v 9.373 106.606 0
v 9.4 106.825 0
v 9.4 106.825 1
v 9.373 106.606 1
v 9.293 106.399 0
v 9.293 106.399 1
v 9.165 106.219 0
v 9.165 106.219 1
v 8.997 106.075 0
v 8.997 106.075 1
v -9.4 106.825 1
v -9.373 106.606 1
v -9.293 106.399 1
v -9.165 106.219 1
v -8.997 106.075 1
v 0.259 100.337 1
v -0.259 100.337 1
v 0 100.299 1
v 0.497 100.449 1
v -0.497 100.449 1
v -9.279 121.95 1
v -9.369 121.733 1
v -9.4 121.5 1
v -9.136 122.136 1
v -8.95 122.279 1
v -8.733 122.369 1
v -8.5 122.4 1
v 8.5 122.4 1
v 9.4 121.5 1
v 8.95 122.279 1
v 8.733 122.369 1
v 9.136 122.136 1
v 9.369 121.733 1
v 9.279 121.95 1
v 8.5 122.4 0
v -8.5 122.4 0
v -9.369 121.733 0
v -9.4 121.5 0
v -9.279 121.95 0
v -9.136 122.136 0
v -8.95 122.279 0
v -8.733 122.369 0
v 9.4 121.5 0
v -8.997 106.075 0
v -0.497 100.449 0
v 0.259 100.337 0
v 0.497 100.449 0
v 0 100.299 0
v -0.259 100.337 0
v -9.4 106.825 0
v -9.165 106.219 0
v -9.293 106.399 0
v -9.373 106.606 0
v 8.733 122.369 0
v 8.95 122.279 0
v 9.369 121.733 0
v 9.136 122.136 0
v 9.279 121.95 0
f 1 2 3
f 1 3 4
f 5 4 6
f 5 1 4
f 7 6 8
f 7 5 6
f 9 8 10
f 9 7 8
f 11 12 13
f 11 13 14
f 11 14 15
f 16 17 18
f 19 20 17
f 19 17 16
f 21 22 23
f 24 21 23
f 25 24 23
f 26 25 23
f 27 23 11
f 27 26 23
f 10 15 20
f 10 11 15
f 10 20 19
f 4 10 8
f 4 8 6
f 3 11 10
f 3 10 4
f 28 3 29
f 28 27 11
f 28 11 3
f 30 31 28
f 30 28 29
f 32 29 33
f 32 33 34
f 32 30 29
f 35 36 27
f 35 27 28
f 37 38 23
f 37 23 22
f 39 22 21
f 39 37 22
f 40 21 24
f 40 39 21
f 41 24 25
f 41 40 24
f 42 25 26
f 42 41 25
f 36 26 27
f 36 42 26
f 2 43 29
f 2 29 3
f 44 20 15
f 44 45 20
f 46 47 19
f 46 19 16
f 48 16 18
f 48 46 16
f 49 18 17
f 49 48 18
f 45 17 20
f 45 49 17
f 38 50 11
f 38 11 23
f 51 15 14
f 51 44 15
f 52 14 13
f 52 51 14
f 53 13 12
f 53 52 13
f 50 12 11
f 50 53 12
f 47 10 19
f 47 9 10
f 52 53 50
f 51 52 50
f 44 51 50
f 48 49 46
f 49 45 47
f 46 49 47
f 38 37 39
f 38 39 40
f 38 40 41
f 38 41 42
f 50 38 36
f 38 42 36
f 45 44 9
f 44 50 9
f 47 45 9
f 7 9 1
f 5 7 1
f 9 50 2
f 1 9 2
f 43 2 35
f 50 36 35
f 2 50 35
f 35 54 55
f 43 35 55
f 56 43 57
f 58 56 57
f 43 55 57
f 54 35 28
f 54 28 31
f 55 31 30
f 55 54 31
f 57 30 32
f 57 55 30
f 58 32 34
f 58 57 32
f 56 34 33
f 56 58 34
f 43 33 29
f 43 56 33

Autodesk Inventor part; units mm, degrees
ref_plane "YZ Plane" through (0, 0, 0) normal (1, 0, 0) x (0, 1, 0)
ref_plane "XZ Plane" through (0, 0, 0) normal (0, 1, 0) x (-1, 0, 0)
ref_plane "XY Plane" through (0, 0, 0) normal (0, 0, 1) x (1, 0, 0)
ref_plane "Arbeitsebene1" through (0, 0, 0) normal (0, 0, 1) x (1, 0, 0)
sketch "Skizze1" plane through (0, 0, 0) normal (0, 0, 1) x (1, 0, 0)
  line L0 (9.1071, 105.908) -> (0.6071, 100.2819) construction
  arc A0 (9.1071, 105.908) -> (9.6, 106.8252) centre (8.5, 106.8252) ccw construction
  line L1 (9.6, 121.5) -> (9.6, 106.8252) construction
  arc A1 (9.6, 121.5) -> (8.5, 122.6) centre (8.5, 121.5) ccw construction
  line L2 (-8.5, 122.6) -> (8.5, 122.6) construction
  arc A2 (-8.5, 122.6) -> (-9.6, 121.5) centre (-8.5, 121.5) ccw construction
  line L3 (-9.6, 106.8252) -> (-9.6, 121.5) construction
  arc A3 (-9.6, 106.8252) -> (-9.1071, 105.908) centre (-8.5, 106.8252) ccw construction
  line L4 (-0.6071, 100.2819) -> (-9.1071, 105.908) construction
  arc A4 (-0.6071, 100.2819) -> (0.6071, 100.2819) centre (0, 101.1992) ccw construction
  circle A5 centre (5.6569, 118.6569) radius 1.6 construction
  circle A6 centre (5.6569, 107.3431) radius 1.6 construction
  circle A7 centre (-5.6569, 107.3431) radius 1.6 construction
  circle A8 centre (-5.6569, 118.6569) radius 1.6 construction
  circle A9 centre (0, 113) radius 3 construction
  arc A10 (-8.5, 122.4) -> (-9.4, 121.5) centre (-8.5, 121.5) ccw
  line L5 (-8.5, 122.4) -> (8.5, 122.4)
  arc A11 (9.4, 121.5) -> (8.5, 122.4) centre (8.5, 121.5) ccw
  line L6 (9.4, 121.5) -> (9.4, 106.8252)
  arc A12 (8.9967, 106.0747) -> (9.4, 106.8252) centre (8.5, 106.8252) ccw
  line L7 (8.9967, 106.0747) -> (0.4967, 100.4487)
  arc A13 (-0.4967, 100.4487) -> (0.4967, 100.4487) centre (0, 101.1992) ccw
  line L8 (-0.4967, 100.4487) -> (-8.9967, 106.0747)
  arc A14 (-9.4, 106.8252) -> (-8.9967, 106.0747) centre (-8.5, 106.8252) ccw
  line L9 (-9.4, 106.8252) -> (-9.4, 121.5)
  point P0 (0, 0)
  dimension "d2" = 0
  dimension "d0" = 0.2
extrude "Extrusion1" add sketch "Skizze1" along normal blind 1
properties part number "Cover_Robot_Motor_Shoulder"
